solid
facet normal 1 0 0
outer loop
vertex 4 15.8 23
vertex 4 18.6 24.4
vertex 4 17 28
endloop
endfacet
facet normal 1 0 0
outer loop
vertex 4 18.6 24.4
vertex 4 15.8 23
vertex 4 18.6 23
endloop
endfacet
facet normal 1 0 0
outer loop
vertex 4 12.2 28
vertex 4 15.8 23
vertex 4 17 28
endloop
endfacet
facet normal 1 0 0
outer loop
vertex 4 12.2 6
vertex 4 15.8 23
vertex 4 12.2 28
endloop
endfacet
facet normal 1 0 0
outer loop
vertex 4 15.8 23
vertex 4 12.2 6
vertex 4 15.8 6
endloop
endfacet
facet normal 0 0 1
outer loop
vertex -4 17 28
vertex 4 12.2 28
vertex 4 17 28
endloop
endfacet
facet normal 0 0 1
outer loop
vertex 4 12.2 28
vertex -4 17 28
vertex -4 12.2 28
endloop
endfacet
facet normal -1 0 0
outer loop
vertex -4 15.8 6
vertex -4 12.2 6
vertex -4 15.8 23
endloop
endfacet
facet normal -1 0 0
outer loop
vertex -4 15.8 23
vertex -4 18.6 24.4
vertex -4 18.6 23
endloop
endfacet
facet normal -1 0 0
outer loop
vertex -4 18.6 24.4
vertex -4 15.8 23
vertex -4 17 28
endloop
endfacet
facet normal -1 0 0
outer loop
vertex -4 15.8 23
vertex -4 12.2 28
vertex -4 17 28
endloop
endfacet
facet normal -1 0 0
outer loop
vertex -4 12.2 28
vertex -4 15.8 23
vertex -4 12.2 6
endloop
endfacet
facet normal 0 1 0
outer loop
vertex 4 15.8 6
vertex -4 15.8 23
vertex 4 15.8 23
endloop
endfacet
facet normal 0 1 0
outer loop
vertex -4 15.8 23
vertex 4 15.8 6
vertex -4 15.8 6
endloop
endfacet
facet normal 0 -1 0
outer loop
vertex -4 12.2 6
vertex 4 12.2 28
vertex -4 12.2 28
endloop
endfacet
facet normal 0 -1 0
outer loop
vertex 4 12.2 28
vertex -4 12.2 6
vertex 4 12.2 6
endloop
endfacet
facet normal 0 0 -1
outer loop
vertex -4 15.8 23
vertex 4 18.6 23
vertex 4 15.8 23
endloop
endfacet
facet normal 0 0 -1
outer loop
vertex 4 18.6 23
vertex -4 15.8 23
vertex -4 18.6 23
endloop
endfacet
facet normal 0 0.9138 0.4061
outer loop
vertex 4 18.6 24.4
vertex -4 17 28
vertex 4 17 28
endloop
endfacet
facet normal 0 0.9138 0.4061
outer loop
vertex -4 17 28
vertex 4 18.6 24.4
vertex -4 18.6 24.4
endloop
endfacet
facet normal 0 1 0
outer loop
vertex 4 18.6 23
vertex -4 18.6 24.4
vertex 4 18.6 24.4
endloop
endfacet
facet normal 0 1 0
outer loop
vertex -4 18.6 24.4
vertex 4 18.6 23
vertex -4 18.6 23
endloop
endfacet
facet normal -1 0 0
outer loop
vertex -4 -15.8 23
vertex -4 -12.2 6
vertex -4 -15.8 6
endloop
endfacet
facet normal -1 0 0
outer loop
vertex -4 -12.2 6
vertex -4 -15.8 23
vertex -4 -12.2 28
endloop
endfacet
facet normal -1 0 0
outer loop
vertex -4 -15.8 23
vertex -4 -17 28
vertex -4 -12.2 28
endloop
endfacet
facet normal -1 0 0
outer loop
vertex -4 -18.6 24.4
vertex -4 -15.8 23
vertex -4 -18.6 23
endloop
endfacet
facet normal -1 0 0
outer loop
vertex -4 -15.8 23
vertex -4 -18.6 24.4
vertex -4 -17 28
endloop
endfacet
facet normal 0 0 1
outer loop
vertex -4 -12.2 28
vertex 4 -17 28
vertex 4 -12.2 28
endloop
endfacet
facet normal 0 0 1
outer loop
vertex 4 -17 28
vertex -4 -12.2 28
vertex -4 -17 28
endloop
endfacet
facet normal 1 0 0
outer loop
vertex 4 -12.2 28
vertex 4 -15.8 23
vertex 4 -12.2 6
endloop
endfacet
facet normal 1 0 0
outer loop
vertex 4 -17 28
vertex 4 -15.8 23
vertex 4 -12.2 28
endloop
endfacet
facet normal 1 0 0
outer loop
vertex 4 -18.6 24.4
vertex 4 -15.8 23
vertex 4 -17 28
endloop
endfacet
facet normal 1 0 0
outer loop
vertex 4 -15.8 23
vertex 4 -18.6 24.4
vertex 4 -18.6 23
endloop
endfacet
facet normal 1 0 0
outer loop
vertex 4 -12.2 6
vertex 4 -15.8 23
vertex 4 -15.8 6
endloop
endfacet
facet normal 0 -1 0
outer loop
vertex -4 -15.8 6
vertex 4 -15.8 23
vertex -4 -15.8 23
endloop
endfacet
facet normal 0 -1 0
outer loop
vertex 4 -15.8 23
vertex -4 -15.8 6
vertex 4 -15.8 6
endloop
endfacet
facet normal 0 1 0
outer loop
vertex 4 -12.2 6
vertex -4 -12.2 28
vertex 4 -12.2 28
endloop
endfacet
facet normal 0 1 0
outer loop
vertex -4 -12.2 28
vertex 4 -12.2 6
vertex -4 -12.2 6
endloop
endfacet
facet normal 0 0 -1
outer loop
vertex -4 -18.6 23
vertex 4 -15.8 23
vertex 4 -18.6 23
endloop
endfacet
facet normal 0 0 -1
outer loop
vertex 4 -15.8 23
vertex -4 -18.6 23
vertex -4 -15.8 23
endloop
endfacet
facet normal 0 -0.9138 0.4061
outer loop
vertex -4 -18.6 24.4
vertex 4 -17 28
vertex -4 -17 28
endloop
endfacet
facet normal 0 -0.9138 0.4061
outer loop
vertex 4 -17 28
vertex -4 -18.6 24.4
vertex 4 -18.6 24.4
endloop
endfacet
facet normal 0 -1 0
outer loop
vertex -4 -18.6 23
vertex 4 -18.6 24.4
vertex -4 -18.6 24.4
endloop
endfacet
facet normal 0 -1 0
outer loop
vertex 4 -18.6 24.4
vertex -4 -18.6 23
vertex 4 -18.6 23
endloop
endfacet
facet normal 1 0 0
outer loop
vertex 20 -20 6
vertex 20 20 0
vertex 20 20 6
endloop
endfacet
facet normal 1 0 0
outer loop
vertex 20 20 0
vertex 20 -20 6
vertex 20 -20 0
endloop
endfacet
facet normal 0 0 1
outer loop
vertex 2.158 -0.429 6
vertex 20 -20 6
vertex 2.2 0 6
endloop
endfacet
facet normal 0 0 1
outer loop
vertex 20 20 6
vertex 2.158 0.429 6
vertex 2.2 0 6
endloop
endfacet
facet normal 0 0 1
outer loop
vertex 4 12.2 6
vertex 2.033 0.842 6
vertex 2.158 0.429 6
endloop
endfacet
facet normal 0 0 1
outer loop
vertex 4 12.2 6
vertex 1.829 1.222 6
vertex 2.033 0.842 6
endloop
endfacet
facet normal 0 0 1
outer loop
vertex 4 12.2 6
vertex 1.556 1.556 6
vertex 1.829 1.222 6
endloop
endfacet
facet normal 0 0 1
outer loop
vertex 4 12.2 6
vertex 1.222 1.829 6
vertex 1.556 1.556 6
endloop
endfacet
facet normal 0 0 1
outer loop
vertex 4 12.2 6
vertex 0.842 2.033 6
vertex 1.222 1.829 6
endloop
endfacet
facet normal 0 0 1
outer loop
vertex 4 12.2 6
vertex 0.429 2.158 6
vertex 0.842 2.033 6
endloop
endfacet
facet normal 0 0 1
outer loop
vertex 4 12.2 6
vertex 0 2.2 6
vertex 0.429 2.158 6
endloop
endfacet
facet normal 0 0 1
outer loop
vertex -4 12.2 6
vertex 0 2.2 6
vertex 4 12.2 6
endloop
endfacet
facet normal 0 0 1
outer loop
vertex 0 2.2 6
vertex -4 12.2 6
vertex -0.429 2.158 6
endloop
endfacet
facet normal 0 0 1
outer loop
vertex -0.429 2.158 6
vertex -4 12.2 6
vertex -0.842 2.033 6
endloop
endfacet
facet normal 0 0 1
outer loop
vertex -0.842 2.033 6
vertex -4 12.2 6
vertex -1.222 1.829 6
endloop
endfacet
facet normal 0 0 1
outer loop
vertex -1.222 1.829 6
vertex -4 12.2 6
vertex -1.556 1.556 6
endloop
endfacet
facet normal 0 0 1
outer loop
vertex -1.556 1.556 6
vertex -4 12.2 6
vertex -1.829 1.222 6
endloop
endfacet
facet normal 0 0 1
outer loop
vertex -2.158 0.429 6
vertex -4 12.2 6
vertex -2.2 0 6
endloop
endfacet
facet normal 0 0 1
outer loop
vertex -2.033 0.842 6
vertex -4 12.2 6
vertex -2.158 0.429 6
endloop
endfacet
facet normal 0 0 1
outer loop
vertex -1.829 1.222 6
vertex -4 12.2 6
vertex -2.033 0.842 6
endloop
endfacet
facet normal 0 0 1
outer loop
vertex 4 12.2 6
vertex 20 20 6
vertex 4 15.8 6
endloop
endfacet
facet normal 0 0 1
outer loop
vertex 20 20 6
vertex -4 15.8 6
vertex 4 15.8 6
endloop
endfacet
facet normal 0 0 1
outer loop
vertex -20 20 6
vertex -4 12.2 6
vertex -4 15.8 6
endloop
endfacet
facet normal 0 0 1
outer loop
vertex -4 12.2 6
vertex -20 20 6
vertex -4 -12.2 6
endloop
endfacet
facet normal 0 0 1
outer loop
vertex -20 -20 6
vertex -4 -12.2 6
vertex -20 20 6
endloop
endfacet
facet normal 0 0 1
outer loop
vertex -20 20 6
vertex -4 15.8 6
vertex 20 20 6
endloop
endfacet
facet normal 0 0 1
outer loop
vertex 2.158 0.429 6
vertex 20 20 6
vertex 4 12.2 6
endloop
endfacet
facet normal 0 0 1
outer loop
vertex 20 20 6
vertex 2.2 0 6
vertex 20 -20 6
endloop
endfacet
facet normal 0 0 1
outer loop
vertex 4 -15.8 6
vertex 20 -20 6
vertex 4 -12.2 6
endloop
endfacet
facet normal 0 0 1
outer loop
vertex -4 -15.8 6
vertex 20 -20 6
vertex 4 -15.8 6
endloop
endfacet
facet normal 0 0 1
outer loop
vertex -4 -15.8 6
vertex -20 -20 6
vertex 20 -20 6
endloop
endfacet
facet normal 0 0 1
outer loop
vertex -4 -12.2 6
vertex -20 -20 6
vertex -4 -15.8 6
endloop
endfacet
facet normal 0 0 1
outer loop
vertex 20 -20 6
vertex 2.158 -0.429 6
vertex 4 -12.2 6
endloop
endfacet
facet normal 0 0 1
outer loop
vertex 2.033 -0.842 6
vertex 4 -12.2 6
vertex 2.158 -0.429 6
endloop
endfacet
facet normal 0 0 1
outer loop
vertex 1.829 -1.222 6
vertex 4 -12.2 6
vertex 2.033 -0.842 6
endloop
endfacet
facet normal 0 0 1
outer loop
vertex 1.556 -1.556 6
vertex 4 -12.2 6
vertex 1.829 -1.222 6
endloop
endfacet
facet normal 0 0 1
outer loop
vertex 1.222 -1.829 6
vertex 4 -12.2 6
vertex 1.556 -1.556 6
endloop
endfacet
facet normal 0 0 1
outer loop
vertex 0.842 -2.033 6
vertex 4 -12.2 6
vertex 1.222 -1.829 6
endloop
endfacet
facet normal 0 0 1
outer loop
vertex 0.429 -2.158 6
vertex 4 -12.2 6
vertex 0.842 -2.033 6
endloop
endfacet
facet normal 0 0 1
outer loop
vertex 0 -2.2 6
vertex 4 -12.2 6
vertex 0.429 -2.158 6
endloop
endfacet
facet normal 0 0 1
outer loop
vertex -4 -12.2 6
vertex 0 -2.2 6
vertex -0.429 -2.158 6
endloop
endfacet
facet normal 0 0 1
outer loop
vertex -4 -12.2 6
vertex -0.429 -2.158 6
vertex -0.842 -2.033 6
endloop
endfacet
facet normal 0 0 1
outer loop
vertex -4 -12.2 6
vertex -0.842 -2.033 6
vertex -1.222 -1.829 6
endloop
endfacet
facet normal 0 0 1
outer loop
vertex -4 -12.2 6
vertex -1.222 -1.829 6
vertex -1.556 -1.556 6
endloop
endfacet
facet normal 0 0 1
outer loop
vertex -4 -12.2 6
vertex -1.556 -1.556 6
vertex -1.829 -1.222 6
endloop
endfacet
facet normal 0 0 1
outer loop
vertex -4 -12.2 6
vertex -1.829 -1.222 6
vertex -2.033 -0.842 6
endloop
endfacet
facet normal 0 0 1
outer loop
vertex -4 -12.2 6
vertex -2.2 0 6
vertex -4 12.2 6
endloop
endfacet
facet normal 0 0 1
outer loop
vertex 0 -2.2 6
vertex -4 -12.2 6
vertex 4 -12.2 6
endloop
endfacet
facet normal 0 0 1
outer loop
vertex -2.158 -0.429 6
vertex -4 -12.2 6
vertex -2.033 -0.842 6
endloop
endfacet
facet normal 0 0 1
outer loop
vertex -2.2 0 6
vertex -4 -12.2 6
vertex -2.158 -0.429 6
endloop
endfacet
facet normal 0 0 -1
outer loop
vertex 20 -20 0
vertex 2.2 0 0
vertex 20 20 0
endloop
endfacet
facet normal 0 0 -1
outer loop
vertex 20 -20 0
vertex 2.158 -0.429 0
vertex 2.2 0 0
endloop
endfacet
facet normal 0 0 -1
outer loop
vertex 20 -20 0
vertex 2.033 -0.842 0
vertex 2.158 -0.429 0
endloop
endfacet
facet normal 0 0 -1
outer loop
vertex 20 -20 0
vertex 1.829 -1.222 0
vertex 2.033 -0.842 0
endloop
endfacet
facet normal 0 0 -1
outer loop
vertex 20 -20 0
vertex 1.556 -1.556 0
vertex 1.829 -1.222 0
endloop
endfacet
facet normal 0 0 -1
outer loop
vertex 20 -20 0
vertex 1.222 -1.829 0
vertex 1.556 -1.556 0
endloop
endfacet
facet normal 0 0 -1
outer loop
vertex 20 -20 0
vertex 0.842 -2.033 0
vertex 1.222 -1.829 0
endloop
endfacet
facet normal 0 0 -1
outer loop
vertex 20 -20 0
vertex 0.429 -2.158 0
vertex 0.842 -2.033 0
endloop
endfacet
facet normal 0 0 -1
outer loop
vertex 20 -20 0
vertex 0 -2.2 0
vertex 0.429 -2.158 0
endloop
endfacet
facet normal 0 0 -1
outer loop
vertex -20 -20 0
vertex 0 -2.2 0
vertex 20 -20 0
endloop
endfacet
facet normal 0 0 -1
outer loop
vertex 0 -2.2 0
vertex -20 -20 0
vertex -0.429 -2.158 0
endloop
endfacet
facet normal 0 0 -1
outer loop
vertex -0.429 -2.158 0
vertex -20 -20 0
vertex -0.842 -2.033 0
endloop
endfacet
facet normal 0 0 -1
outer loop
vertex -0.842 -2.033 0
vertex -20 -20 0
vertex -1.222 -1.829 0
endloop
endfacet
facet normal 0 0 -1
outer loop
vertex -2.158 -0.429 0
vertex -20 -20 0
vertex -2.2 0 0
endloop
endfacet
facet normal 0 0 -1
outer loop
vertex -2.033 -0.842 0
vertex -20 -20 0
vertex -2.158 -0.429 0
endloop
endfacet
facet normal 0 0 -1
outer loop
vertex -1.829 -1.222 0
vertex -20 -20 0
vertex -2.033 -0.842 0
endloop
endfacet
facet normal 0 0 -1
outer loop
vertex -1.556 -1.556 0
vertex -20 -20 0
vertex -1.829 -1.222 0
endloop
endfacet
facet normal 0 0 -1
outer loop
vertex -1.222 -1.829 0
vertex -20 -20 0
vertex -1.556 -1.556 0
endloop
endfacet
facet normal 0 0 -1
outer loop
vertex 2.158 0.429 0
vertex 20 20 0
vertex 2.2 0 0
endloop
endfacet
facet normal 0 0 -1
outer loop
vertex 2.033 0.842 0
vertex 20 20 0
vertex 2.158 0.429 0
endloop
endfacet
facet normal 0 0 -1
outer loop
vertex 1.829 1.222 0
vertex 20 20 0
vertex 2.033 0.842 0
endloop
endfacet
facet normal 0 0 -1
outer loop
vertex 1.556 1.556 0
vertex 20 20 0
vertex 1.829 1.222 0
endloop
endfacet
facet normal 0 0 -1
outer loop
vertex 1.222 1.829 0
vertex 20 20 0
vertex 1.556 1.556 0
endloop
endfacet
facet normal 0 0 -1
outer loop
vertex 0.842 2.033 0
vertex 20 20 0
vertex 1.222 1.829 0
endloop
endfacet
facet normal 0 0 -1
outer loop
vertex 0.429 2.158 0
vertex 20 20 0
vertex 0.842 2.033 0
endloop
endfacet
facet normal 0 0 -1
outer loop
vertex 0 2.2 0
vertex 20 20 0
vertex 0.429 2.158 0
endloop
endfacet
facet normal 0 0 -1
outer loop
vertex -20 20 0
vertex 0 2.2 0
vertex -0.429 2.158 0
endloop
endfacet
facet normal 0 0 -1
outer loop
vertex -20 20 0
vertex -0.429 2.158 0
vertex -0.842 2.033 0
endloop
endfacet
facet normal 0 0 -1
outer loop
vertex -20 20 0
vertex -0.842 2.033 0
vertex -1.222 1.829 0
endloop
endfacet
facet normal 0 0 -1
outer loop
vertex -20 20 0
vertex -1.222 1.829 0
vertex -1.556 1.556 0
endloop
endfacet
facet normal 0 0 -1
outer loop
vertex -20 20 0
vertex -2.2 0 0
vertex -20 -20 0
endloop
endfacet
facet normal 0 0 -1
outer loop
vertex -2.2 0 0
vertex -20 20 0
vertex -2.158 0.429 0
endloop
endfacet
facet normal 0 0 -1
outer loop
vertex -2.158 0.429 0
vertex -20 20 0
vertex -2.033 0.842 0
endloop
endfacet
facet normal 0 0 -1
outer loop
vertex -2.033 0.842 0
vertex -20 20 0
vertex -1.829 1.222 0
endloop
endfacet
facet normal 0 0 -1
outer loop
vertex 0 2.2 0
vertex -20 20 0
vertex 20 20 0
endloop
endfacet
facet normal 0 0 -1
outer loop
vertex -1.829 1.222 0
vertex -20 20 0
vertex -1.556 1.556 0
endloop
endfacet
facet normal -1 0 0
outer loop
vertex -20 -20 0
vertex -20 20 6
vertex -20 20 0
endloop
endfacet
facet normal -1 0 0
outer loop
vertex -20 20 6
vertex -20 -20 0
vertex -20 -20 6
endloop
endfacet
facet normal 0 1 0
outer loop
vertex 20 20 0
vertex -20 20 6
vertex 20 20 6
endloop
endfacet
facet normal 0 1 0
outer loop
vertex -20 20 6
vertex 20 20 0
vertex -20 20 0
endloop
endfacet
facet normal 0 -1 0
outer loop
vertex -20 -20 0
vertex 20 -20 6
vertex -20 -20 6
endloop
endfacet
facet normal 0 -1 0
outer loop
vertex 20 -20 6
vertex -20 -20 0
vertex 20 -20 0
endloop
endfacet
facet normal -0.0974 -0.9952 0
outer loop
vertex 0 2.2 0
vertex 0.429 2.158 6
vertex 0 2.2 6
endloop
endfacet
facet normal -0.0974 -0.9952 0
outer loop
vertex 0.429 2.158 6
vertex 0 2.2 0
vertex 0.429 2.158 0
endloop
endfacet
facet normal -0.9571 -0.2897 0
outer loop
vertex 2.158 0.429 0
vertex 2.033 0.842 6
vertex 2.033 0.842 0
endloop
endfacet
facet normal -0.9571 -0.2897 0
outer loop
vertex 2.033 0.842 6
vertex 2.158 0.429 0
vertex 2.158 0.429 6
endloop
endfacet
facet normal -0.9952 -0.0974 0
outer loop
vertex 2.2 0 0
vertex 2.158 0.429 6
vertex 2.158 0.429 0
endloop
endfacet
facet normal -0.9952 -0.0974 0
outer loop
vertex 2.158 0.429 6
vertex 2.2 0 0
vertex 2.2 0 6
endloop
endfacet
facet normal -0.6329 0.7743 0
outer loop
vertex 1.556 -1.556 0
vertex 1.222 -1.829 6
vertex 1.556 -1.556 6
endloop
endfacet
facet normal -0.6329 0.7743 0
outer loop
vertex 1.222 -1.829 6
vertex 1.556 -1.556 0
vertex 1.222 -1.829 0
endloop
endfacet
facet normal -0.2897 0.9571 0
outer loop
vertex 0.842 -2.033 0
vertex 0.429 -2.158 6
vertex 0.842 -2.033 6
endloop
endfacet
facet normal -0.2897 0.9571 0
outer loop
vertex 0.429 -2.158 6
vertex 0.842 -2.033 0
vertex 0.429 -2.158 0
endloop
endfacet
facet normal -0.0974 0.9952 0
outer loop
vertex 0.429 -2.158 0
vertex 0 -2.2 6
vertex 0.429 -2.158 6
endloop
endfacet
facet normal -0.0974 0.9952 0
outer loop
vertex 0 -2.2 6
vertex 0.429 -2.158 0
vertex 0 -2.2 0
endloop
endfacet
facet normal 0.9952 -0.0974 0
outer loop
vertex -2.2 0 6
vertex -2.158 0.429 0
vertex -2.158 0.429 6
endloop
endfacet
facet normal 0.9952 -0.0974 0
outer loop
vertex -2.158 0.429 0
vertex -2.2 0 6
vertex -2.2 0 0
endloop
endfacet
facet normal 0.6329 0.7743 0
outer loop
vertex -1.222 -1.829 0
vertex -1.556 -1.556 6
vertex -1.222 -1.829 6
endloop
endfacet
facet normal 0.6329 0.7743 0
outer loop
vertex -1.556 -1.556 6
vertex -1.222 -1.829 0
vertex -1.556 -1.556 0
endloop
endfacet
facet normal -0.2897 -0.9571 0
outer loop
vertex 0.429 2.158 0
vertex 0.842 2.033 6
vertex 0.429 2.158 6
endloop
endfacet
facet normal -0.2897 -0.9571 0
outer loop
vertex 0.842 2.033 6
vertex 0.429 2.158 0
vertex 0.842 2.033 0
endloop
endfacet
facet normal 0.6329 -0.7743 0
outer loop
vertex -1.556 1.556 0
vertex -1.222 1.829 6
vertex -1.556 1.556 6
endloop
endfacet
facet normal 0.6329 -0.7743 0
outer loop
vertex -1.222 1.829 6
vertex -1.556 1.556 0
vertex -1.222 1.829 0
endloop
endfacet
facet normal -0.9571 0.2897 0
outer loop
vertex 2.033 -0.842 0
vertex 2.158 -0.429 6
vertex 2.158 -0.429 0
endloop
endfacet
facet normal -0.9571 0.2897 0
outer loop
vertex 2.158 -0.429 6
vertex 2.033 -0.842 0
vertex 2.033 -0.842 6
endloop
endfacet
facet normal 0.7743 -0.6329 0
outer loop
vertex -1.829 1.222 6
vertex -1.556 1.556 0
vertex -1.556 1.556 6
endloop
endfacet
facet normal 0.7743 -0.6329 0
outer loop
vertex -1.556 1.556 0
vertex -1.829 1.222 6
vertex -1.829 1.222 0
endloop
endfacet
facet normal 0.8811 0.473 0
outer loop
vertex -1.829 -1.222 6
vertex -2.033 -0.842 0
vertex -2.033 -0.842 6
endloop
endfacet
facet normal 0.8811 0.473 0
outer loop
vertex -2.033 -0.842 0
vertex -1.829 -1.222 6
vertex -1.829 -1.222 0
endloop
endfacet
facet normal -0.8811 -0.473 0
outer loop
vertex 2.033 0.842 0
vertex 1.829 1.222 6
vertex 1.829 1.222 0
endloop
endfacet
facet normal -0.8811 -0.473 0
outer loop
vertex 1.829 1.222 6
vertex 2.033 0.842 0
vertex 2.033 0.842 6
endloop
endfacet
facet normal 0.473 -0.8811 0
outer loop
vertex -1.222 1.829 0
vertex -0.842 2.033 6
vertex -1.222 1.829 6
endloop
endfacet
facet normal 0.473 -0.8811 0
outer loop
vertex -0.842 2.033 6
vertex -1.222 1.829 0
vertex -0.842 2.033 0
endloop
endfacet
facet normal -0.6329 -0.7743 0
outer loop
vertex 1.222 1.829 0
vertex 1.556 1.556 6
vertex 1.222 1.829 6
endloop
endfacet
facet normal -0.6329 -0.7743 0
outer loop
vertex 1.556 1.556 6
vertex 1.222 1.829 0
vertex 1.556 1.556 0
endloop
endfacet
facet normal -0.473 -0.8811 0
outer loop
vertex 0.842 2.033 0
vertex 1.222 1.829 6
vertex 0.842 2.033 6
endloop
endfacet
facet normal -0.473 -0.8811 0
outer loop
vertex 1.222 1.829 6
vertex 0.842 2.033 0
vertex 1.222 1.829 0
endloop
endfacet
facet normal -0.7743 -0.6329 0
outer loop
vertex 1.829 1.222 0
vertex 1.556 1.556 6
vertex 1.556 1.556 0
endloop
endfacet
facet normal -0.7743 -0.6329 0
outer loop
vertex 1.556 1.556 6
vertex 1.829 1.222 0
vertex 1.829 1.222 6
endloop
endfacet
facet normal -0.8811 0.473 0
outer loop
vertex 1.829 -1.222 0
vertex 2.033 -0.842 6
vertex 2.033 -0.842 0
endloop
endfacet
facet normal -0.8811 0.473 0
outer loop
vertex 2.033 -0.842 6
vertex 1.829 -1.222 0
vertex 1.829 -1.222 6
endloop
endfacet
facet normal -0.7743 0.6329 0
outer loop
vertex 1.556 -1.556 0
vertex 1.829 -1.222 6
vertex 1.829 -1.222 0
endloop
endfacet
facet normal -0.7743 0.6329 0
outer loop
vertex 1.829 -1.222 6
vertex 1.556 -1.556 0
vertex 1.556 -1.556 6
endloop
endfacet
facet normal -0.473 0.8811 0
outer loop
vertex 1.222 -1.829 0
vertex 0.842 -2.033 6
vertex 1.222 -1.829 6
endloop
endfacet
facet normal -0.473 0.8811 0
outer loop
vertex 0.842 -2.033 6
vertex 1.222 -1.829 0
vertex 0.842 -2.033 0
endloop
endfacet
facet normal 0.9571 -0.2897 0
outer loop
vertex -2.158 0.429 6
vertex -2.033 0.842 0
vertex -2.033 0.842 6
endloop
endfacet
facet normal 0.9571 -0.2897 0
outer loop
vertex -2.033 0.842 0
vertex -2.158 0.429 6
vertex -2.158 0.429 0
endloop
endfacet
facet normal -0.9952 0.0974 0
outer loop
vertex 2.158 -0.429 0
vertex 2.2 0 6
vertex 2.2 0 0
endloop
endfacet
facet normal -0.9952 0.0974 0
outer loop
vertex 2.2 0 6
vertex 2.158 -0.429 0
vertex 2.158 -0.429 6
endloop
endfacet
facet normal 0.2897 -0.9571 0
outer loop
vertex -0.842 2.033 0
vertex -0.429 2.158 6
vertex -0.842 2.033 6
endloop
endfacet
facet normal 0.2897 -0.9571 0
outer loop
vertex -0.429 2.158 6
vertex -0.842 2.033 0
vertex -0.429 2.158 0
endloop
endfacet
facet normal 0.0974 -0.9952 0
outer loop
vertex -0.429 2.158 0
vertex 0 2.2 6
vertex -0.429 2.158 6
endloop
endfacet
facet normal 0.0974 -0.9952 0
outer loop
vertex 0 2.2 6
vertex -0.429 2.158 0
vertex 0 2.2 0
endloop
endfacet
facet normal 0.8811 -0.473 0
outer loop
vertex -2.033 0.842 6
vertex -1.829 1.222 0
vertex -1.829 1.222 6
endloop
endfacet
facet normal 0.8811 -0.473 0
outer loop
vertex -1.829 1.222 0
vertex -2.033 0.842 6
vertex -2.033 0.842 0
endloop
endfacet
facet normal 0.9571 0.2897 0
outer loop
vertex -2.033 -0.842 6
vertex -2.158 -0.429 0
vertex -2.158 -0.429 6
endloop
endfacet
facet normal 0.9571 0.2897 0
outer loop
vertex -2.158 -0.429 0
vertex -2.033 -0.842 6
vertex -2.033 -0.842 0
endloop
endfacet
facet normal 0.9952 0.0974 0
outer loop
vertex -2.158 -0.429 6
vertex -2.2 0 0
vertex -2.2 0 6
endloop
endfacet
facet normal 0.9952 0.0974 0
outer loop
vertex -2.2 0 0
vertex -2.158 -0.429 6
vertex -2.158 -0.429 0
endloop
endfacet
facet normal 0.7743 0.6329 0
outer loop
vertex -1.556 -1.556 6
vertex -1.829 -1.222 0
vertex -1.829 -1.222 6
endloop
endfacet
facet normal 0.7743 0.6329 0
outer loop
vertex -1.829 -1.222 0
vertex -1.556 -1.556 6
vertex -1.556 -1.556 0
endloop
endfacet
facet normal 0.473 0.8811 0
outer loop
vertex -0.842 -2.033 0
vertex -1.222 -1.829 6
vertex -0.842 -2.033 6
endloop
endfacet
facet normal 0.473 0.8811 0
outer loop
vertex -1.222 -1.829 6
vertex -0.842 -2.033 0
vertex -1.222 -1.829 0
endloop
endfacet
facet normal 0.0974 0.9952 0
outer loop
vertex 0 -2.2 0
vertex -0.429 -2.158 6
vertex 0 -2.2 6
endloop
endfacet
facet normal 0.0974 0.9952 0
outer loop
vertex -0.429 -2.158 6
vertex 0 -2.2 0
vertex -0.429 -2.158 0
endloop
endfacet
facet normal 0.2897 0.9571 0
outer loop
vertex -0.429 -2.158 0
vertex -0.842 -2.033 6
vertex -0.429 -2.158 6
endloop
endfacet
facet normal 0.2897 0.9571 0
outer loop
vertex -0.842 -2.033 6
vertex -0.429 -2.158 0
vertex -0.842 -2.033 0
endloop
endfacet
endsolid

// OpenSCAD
$fn = 32;

// ----------------------------------------------------------------------
// Snap-fit latch: 2 arms, 22 mm tall, 3 mm undercut hooks
// ----------------------------------------------------------------------

// --- parameters (mm) ---
base_d = 40;              // base plate depth
base_h = 6;               // base plate thickness
span = 28;                // distance between opposite arms
arm_t = 3.6;              // arm thickness
arm_d = 8;                // arm width
height = 22;              // free arm length
head_len = 3;             // hook reach
head_h = 5;               // hook height
lead = 1.4;               // lead-in ramp thickness
bore_d = 4.4;             // base fixing bore
top_z = 28;               // height of the arm tips above the base

arms = 2;

difference() {
  union() {
    /* base plate, centred on the arm ring */
    translate([-20, -20, 0]) cube([base_d, base_d, base_h]);
    for (a = [0 : 360 / arms : 359]) rotate([0, 0, a]) {
    /* arm, sunk 0.5 mm into the base */
    translate([-arm_d / 2, span / 2 - arm_t / 2, base_h - 0.5]) cube([arm_d, arm_t, height + 0.5]);
    /* hook: a convex hull of a tall inner block and a thin outer lip
       gives a flat undercut below and a lead-in ramp on top */
    hull() {
      translate([-arm_d / 2, span / 2 + arm_t / 2 - 0.6, top_z - head_h]) cube([arm_d, lead + 0.4, head_h]);
      translate([-arm_d / 2, span / 2 + arm_t / 2 - 0.2, top_z - head_h]) cube([arm_d, head_len, lead]);
    }
    }
  }
  translate([0, 0, -2.5]) cylinder(h = base_h + 5, d = bore_d);
}
